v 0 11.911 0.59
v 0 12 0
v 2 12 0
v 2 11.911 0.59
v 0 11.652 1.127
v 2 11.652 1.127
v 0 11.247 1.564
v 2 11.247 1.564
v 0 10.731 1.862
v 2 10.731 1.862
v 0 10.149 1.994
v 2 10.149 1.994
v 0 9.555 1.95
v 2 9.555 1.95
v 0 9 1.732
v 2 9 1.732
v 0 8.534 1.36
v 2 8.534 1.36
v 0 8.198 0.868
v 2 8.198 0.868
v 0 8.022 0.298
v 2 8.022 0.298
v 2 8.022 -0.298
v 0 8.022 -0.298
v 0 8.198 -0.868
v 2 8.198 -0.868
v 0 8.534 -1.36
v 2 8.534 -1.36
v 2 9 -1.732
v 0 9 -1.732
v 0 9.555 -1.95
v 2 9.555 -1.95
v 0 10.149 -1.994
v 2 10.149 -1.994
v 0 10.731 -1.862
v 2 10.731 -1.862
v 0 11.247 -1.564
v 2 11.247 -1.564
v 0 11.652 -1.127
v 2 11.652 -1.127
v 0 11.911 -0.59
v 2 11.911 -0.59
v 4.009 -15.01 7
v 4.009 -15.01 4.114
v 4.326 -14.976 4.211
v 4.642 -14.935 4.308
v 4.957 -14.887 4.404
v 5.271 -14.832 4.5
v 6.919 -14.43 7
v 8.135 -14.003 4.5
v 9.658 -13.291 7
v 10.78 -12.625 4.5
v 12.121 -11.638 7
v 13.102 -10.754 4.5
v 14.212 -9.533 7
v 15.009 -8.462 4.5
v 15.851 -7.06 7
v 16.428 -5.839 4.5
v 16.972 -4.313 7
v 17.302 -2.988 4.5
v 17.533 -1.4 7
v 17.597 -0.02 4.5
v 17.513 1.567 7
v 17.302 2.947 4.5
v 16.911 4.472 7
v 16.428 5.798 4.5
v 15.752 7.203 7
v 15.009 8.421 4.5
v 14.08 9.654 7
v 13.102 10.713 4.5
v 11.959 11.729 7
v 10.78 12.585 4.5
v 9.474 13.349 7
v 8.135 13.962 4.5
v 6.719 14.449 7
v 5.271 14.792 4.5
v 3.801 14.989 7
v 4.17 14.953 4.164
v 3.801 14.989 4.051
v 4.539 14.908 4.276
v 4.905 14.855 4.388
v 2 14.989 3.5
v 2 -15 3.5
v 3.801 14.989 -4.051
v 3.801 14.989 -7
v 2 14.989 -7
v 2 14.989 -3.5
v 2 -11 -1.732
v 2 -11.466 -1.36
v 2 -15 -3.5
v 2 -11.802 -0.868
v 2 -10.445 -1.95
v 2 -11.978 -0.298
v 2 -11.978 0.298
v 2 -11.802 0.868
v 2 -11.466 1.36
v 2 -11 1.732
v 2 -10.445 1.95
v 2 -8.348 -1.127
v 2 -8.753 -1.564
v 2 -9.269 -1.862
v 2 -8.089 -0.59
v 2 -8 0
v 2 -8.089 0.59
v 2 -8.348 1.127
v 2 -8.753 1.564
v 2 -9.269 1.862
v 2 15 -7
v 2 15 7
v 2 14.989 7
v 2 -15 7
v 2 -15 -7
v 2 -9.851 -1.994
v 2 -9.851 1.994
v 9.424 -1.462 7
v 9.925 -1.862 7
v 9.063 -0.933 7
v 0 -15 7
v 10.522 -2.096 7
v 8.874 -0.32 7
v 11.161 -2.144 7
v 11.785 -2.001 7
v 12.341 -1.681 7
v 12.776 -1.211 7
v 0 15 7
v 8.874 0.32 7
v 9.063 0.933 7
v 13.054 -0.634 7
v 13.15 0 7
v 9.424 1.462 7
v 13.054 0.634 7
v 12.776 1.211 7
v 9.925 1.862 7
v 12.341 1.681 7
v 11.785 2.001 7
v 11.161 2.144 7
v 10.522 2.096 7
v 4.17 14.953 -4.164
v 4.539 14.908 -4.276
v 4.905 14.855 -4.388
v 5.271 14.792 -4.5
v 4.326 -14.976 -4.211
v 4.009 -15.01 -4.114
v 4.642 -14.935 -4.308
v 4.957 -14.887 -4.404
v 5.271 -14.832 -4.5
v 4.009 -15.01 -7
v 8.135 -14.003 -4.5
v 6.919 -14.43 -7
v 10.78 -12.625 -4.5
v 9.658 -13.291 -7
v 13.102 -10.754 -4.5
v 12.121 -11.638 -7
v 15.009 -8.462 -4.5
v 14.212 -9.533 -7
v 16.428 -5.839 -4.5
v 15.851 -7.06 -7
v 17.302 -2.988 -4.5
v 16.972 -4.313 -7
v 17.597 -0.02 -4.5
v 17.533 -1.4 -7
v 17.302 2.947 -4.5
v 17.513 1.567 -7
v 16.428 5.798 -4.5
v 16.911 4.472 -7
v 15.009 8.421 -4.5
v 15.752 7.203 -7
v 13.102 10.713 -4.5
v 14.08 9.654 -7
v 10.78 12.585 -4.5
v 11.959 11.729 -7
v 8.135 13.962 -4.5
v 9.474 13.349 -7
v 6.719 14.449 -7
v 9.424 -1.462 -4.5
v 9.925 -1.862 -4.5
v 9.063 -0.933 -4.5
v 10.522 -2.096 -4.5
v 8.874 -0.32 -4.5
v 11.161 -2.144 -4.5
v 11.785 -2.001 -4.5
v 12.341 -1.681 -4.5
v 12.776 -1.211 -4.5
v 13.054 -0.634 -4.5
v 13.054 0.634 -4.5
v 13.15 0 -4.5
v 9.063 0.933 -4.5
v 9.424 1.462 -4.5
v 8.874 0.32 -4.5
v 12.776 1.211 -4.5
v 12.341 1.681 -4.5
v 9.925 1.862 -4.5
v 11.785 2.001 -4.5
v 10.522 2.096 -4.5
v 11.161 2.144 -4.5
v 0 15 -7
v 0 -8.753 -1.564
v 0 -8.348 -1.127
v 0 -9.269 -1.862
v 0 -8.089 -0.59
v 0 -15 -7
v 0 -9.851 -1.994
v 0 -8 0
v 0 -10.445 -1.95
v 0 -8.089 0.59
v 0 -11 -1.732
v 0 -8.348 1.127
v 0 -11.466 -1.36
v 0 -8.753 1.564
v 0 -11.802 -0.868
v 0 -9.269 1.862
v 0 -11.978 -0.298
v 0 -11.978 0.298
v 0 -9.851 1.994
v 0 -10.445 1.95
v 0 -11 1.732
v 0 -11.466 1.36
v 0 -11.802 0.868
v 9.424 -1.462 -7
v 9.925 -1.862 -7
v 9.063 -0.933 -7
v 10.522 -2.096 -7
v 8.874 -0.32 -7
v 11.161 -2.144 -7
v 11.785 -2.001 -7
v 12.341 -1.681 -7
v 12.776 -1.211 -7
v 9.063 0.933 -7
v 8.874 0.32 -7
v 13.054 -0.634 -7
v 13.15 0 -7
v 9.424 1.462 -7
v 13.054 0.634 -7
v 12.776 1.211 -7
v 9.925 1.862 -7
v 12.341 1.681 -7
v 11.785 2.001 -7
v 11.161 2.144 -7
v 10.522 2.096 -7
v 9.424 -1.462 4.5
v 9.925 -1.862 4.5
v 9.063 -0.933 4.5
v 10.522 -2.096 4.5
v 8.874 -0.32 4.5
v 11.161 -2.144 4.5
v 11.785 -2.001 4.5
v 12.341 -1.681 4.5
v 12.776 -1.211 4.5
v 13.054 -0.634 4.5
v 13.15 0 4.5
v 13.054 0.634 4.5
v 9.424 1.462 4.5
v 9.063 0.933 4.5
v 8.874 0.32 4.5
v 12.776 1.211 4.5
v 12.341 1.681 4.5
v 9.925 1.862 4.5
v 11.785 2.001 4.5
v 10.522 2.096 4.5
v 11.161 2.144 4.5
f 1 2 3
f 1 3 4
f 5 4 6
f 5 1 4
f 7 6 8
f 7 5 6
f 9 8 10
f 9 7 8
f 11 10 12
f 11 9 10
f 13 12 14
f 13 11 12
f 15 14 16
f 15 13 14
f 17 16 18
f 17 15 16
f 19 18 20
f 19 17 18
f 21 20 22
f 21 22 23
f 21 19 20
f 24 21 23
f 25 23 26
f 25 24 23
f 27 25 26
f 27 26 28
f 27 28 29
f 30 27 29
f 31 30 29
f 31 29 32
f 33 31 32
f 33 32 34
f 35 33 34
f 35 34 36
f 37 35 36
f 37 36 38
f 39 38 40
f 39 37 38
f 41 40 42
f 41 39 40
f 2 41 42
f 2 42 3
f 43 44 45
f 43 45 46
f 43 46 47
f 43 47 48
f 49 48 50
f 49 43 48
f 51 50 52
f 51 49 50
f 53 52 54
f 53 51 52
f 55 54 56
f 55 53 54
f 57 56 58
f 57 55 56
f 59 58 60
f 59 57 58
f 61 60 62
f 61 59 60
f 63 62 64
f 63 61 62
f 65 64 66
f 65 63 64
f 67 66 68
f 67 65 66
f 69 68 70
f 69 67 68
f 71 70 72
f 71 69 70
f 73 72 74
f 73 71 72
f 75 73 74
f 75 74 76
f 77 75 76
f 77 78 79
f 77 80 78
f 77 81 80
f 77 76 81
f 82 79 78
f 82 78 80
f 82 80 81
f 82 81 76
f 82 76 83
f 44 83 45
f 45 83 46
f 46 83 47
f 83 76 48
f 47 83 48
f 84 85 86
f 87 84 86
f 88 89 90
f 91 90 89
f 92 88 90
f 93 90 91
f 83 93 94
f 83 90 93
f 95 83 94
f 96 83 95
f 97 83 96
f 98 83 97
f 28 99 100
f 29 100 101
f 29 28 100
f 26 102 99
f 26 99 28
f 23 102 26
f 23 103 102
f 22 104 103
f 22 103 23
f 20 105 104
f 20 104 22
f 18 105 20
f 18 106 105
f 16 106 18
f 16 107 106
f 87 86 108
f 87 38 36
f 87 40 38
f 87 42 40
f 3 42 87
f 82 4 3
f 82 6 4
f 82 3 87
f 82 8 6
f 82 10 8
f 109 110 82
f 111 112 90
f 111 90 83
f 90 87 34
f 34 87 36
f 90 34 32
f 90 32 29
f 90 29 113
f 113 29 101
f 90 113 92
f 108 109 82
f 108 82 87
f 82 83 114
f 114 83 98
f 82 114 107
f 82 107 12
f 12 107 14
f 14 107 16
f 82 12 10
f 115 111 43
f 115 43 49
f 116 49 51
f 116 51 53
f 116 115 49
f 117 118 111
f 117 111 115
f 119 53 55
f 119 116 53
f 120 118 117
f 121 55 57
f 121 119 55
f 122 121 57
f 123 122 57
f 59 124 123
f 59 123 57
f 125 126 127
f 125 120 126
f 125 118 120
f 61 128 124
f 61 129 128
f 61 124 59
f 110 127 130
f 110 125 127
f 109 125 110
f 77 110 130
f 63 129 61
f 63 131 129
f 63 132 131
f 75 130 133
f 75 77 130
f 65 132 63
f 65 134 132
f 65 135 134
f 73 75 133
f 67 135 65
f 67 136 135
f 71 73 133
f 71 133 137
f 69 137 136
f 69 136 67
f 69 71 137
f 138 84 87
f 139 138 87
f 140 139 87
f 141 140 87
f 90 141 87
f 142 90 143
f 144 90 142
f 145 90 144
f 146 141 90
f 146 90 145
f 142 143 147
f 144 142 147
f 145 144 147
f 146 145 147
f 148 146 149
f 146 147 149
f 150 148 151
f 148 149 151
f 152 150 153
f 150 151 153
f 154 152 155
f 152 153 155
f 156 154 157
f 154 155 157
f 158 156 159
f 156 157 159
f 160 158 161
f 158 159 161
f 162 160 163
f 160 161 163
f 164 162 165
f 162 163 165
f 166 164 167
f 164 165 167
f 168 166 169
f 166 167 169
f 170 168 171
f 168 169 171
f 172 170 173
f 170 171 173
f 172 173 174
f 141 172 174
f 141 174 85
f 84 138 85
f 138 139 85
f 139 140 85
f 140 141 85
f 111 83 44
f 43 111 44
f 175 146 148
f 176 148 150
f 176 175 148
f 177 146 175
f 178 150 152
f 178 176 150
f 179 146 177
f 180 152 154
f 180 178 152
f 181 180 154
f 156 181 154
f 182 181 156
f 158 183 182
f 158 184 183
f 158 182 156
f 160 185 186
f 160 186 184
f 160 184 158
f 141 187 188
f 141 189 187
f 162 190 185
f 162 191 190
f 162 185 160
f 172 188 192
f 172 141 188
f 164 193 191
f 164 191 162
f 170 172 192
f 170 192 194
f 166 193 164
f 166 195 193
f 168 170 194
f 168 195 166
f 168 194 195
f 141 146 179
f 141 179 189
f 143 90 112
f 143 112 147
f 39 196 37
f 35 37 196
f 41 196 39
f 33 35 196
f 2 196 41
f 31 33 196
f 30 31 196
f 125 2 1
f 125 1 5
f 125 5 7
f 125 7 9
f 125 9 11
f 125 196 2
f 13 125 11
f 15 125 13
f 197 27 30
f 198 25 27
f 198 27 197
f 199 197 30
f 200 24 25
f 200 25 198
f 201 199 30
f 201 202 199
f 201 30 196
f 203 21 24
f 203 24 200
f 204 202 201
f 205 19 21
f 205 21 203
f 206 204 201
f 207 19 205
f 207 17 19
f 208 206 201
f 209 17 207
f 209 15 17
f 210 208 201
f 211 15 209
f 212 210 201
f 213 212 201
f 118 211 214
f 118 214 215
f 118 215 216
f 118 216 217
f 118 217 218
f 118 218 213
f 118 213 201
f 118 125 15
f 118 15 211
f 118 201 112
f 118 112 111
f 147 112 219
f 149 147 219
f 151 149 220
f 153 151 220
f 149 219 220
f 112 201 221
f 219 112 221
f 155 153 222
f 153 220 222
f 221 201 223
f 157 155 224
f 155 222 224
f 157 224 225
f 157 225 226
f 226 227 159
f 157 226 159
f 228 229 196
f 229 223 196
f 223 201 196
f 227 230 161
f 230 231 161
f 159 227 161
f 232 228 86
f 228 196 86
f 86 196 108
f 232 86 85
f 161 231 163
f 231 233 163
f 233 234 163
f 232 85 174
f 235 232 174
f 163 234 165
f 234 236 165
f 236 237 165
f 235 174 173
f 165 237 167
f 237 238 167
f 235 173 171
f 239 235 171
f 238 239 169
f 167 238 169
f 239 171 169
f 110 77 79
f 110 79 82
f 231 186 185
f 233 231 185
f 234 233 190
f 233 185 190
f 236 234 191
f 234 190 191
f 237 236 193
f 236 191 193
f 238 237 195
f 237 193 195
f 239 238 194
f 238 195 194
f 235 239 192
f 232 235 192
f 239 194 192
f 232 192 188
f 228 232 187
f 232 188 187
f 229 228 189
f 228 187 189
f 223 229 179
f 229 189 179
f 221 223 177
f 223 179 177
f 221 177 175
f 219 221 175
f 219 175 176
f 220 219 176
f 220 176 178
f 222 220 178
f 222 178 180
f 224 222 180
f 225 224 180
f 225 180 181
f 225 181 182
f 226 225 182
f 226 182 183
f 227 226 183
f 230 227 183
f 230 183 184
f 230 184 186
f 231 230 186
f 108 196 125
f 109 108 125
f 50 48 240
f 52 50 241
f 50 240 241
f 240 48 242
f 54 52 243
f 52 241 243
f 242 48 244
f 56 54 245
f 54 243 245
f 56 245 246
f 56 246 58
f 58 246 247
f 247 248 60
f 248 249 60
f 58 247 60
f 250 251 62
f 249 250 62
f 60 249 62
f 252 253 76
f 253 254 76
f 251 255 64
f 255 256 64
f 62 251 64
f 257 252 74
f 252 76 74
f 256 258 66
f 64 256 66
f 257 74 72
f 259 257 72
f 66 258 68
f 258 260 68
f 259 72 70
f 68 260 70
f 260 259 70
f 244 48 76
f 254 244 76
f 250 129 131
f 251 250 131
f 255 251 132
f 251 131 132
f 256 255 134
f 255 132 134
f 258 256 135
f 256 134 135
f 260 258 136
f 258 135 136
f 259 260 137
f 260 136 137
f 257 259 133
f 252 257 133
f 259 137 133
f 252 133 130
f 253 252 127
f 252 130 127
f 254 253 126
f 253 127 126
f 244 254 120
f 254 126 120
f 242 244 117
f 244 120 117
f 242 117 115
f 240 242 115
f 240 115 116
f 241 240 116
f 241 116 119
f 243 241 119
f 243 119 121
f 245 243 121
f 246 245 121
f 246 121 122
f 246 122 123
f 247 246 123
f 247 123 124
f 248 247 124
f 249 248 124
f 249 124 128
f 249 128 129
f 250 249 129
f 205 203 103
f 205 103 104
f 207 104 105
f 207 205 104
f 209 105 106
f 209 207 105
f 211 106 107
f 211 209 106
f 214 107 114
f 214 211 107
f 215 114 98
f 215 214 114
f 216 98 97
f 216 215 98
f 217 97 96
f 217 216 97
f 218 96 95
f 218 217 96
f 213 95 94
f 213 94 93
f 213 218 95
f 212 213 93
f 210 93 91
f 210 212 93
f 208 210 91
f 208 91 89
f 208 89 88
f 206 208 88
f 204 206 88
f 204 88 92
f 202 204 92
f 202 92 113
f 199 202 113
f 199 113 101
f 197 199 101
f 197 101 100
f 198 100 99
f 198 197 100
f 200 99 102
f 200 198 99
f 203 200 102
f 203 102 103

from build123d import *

# Parameters (mm, degrees)
F0_W     = 30
F0_H     = 14
F0_R     = 2
F1_DEPTH = 2
F4_DEPTH = 2.5
F6_SIZE2 = 3.2708526185
F6_SIZE  = 1
F8_R     = 2.15
F9_DEPTH = 14.701


with BuildPart() as f1:
    # F0 (on Right) → F1 (new body)
    with BuildSketch(Plane.YZ):
        Rectangle(F0_W, F0_H)
        with Locations((-10, 0)):
            Circle(F0_R, mode=Mode.SUBTRACT)
        with Locations((10, 0)):
            Circle(F0_R, mode=Mode.SUBTRACT)
    extrude(amount=F1_DEPTH)

    # F3 (on offset) → F4 (join)
    with BuildSketch(Plane.XY.offset(7)):
        with BuildLine():
            ThreePointArc((4.0091983974, -15.0103159249), (17.5963547051, 0.0841872352), (3.8013714597, 14.9889944946))
            Line((3.8013714597, 14.9889944946), (0, 14.9889944946))
            Line((0, 14.9889944946), (0, -14.9888552843))
            Line((0, -14.9888552843), (4.0091983974, -15.0103159249))
        make_face()
    extrude(amount=-F4_DEPTH)

    # F5: F1 across plane


with BuildPart() as f1_1:
    add(f1.part)
    add(f1.part.mirror(Plane.XY))

    # F6
    f6_edges = [f1_1.edges().sort_by_distance(p)[0] for p in [
        (2, -0.005283, 4.5),
        (2, -0.005283, -4.5),
    ]]
    f6_side = f1_1.faces().sort_by_distance((2, 0.003234, 0))[0]
    chamfer(f6_edges, length=F6_SIZE, length2=F6_SIZE2, reference=f6_side)

    # F8 (on offset) → F9 (cut, through all)
    with BuildSketch(Plane.XY.offset(7.7)):
        with Locations((11, 0)):
            Circle(F8_R)
    extrude(amount=-F9_DEPTH, mode=Mode.SUBTRACT)


solid = f1_1.part
